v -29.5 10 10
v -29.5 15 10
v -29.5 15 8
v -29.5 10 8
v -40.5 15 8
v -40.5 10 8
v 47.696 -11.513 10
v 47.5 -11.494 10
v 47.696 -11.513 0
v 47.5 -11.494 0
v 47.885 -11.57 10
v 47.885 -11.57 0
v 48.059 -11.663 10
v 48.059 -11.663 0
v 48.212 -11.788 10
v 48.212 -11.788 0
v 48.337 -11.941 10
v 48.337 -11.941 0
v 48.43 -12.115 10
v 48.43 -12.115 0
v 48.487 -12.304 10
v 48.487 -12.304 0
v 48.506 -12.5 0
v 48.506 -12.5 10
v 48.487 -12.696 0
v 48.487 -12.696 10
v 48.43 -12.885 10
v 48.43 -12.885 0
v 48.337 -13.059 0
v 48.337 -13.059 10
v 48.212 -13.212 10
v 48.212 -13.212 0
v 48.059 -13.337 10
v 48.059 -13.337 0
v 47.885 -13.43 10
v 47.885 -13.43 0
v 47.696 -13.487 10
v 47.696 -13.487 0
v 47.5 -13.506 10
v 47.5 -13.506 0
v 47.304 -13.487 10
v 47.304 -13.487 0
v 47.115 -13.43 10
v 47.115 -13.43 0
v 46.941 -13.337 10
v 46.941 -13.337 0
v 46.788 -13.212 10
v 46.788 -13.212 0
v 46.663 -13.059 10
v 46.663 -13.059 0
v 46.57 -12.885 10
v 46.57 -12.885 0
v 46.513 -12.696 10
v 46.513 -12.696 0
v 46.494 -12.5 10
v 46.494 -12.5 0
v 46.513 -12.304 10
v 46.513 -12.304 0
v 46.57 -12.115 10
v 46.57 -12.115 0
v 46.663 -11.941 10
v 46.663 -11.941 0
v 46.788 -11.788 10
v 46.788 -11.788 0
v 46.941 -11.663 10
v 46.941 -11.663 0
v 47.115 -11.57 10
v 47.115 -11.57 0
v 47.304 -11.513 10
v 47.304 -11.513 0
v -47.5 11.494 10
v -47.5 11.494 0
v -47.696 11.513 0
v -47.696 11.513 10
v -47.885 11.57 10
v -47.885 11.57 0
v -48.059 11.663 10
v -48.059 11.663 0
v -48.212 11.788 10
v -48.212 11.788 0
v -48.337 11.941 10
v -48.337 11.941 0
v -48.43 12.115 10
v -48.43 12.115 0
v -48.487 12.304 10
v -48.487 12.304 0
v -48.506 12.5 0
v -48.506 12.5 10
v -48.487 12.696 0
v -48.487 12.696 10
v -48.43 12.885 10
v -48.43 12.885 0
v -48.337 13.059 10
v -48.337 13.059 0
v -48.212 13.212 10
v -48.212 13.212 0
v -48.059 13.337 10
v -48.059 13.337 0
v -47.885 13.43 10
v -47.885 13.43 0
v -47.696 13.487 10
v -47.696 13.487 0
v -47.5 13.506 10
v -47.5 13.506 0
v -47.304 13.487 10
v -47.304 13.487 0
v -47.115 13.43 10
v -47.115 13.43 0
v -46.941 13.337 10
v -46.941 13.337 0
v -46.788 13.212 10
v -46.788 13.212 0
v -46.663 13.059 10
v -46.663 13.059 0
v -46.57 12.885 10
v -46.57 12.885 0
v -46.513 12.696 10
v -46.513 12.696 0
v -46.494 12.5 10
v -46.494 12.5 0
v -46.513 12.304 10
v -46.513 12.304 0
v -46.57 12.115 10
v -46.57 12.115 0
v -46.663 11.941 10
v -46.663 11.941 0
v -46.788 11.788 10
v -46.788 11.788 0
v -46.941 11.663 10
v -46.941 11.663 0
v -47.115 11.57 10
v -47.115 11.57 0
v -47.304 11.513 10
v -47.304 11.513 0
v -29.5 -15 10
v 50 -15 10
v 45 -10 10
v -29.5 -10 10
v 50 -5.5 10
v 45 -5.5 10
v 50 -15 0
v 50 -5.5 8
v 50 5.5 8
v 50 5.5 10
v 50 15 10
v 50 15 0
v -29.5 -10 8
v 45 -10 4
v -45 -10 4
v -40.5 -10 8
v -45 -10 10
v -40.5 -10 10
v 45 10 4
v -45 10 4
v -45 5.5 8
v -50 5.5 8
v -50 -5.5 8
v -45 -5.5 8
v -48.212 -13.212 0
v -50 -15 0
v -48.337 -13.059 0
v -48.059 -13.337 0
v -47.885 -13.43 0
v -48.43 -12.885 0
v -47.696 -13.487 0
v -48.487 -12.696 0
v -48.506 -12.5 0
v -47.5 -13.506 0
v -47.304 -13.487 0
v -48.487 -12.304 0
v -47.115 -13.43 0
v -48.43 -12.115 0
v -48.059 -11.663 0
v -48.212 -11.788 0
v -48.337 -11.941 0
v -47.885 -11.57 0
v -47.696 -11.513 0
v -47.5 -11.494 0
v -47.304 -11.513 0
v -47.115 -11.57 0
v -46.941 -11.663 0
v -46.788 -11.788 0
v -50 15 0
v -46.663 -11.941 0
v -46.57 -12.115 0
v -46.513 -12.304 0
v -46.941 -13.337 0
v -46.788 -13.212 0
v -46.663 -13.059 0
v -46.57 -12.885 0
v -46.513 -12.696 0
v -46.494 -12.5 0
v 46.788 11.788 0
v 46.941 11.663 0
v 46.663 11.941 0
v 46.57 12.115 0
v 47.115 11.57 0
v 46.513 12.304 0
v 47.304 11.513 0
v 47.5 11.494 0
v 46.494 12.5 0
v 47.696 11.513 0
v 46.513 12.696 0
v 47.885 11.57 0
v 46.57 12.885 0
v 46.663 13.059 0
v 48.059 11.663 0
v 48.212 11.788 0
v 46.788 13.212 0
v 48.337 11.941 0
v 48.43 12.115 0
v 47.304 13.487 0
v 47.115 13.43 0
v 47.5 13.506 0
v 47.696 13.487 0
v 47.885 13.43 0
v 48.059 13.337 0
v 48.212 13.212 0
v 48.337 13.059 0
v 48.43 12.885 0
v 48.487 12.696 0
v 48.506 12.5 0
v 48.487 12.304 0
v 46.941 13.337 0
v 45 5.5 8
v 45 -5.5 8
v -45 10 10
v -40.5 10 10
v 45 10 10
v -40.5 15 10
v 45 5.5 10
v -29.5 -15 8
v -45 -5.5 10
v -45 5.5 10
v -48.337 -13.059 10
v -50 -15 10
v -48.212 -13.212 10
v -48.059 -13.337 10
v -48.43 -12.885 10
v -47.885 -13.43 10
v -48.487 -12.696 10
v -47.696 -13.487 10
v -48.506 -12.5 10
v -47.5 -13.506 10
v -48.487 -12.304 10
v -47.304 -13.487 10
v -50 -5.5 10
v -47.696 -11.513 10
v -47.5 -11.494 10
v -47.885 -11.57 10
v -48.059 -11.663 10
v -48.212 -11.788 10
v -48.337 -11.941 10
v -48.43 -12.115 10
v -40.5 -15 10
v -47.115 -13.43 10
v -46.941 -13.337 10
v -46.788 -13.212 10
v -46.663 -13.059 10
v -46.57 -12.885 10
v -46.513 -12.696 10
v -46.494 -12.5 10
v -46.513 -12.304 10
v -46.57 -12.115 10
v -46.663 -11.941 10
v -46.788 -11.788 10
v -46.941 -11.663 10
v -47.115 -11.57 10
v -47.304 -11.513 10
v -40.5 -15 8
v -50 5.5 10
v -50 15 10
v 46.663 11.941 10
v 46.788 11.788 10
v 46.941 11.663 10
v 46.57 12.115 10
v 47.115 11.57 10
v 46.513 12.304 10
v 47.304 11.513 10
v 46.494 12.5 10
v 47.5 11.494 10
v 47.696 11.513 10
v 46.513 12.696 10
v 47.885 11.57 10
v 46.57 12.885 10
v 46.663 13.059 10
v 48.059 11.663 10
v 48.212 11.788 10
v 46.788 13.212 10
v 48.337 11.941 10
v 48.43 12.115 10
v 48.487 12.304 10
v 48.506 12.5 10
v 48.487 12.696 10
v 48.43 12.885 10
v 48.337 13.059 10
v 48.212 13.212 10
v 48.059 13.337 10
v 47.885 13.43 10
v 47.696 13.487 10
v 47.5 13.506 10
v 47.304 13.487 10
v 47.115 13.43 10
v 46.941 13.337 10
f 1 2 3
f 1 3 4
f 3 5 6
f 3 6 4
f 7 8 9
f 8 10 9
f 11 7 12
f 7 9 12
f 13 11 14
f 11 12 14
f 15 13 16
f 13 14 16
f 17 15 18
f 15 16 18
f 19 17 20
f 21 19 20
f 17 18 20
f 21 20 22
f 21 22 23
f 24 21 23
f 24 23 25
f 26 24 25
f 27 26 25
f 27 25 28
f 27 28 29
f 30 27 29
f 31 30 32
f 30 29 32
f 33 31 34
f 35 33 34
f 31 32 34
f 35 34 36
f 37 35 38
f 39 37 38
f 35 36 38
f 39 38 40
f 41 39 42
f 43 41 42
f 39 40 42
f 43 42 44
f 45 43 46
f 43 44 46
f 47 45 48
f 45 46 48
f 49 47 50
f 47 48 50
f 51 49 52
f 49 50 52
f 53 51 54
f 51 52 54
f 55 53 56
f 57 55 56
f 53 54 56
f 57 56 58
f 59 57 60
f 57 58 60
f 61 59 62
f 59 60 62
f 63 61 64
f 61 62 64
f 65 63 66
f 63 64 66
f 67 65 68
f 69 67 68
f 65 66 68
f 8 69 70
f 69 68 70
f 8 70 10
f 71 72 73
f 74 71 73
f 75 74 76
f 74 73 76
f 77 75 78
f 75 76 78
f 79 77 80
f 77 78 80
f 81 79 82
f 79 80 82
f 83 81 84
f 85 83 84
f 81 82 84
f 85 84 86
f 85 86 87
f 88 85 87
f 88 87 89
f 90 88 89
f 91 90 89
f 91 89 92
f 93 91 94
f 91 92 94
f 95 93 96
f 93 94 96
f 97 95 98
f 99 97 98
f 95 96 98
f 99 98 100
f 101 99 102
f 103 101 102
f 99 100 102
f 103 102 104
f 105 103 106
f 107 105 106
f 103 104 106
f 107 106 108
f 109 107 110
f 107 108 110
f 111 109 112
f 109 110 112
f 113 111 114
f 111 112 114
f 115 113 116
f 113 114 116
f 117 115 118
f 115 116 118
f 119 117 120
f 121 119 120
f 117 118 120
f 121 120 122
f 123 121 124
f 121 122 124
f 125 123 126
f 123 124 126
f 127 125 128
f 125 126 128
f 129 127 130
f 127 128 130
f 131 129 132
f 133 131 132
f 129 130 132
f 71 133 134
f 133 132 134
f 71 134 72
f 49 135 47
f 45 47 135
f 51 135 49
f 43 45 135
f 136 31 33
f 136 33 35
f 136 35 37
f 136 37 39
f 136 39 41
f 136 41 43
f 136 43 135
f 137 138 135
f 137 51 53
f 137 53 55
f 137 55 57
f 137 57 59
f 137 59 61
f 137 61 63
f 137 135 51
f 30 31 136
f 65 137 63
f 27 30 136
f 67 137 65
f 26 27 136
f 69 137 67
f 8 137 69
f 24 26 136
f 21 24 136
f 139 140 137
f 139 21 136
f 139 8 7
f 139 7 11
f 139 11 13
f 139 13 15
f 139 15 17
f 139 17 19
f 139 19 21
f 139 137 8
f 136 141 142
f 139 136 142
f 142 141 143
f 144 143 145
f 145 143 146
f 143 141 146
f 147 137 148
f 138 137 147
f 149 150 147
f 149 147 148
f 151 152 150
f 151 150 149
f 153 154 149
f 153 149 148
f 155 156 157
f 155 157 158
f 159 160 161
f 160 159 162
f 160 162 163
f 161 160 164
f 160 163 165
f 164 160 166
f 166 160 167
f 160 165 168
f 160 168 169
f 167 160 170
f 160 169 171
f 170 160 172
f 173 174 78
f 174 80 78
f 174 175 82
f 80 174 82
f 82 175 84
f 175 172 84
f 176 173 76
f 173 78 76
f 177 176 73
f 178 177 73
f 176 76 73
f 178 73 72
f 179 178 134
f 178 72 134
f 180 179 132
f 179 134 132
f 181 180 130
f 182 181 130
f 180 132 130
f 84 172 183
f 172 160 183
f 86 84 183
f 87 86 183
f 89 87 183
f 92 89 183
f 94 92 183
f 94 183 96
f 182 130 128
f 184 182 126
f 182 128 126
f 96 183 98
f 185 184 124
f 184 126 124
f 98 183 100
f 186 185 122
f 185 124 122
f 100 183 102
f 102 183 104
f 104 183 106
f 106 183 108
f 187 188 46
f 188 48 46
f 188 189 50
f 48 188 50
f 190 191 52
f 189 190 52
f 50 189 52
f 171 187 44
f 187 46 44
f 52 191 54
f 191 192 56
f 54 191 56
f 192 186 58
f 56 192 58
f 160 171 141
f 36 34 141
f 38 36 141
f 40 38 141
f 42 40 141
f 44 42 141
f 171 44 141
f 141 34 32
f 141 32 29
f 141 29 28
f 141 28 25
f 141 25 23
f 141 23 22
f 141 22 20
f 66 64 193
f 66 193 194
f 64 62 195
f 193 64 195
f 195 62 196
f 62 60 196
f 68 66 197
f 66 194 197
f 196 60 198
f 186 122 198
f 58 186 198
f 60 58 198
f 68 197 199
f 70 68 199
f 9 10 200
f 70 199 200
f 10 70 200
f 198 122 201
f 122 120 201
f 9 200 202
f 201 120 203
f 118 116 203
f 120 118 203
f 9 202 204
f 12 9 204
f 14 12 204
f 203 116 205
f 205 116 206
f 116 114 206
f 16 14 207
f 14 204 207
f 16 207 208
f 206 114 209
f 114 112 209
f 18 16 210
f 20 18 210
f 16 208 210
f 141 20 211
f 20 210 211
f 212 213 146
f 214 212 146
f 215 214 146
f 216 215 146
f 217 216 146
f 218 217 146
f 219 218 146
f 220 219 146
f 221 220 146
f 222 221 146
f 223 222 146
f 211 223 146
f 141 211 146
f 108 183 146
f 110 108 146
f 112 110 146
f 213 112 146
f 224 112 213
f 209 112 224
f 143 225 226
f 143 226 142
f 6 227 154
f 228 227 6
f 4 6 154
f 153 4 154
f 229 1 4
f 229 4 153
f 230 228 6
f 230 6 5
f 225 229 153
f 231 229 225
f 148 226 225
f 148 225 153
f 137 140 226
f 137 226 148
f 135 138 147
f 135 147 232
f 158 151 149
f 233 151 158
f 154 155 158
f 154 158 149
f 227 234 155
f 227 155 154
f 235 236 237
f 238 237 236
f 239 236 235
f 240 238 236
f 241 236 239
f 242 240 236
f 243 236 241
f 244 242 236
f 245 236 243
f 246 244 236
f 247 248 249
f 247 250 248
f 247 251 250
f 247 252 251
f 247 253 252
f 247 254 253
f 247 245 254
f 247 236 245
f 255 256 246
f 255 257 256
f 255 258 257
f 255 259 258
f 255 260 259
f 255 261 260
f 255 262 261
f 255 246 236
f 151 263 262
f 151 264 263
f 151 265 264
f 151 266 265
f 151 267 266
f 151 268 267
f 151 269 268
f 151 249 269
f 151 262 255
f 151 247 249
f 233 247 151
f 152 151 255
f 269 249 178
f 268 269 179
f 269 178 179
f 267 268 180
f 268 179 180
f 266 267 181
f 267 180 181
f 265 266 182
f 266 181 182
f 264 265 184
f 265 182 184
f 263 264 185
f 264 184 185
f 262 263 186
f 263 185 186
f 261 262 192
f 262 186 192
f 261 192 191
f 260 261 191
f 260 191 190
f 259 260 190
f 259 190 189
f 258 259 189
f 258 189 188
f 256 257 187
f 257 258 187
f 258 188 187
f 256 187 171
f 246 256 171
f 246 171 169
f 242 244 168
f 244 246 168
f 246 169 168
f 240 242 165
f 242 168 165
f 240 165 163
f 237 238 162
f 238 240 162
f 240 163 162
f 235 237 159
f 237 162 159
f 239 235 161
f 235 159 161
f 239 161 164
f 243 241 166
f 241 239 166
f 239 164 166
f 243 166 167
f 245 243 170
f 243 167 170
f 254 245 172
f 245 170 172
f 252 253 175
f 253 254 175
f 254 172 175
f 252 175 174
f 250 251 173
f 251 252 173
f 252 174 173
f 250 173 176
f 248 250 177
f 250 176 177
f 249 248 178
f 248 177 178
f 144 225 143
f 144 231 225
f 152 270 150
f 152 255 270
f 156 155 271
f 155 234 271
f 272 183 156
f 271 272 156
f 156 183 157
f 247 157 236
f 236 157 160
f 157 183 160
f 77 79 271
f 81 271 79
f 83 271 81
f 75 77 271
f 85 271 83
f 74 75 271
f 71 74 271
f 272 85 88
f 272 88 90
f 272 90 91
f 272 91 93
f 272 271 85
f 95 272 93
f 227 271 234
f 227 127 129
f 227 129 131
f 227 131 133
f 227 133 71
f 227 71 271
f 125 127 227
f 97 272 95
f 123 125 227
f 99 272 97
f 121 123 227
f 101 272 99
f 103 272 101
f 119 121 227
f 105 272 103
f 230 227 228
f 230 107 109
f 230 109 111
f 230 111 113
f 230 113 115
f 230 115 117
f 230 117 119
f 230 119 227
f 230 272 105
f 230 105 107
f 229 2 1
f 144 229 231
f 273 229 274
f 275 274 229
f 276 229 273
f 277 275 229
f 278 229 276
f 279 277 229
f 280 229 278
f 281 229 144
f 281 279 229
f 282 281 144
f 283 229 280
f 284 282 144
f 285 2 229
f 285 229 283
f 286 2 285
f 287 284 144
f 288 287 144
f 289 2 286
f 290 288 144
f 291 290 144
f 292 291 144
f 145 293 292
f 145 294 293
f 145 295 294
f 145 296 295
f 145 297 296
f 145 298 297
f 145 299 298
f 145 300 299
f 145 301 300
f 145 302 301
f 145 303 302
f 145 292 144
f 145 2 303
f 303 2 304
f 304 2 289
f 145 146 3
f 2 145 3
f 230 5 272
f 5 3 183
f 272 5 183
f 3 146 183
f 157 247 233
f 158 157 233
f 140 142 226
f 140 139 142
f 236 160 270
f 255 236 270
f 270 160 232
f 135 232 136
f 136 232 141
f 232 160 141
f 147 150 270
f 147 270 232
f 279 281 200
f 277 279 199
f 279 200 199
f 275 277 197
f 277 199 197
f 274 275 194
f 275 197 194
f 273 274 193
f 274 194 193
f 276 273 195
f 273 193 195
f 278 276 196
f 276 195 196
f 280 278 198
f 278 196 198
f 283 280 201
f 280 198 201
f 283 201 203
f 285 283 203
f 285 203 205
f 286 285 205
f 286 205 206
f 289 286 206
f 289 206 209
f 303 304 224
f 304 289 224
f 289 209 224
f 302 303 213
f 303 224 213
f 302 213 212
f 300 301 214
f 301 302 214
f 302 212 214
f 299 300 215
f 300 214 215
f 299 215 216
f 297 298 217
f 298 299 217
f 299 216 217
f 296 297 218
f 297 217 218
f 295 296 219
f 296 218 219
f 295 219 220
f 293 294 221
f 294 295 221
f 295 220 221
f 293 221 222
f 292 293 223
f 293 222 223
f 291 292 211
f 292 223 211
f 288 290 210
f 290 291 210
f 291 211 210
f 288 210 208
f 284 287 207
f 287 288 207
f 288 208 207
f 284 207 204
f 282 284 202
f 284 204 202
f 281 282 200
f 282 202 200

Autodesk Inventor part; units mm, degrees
ref_plane "YZ Plane" through (0, 0, 0) normal (1, 0, 0) x (0, 1, 0)
ref_plane "XZ Plane" through (0, 0, 0) normal (0, 1, 0) x (-1, 0, 0)
ref_plane "XY Plane" through (0, 0, 0) normal (0, 0, 1) x (1, 0, 0)
sketch "Sketch1" plane through (0, 0, 0) normal (0, 0, 1) x (1, 0, 0)
  line L0 (-50, -15) -> (50, -15)
  line L1 (50, -15) -> (50, 15)
  line L2 (50, 15) -> (-50, 15)
  line L3 (-50, 15) -> (-50, -15)
  line L4 (-50, -15) -> (50, 15) construction
  line L5 (50, -15) -> (-50, 15) construction
  point P0 (0, 0)
  dimension "d0" = 100
  dimension "d1" = 30
extrude "Extrusion1" add sketch "Sketch1" along normal blind 10
sketch "Sketch2" plane through (0, 0, 10) normal (0, 0, 1) x (1, 0, 0)
  line L0 (-50, -15) -> (50, -15) projected
  line L1 (50, -15) -> (50, 15) projected
  line L2 (50, 15) -> (-50, 15) projected
  line L3 (-50, 15) -> (-50, -15) projected
  line L4 (-45, 10) -> (45, 10)
  line L5 (45, 10) -> (45, -10)
  line L6 (45, -10) -> (-45, -10)
  line L7 (-45, -10) -> (-45, 10)
  point P0 (0, 0)
  dimension "d4" = 5
extrude "Extrusion2" cut sketch "Sketch2" against normal blind 6 contours L4 L5 L6 L7
sketch "Sketch3" plane through (0, 0, 10) normal (0, 0, 1) x (1, 0, 0)
  line L0 (-45, -10) -> (-45, 10) projected
  line L1 (-45, 10) -> (45, 10) projected
  line L2 (45, 10) -> (45, -10) projected
  line L3 (45, -10) -> (-45, -10) projected
  line L4 (-50, -15) -> (50, -15) projected
  line L5 (50, -15) -> (50, 15) projected
  line L6 (50, 15) -> (-50, 15) projected
  line L7 (-50, 15) -> (-50, -15) projected
  line L8 (-50, 15) -> (-50, -15) projected
  line L9 (-50, -5.5) -> (-45, -5.5)
  line L10 (-45, -5.5) -> (-45, 5.5)
  line L11 (-45, 5.5) -> (-50, 5.5)
  line L12 (-50, 5.5) -> (-50, -5.5)
  line L13 (-70, 0) -> (70, 0) projected
  line L14 (45, 10) -> (45, -10) projected
  line L15 (50, -15) -> (50, 15) projected
  line L16 (50, 15) -> (-50, 15) projected
  line L17 (-45, 10) -> (45, 10) projected
  line L18 (-40.5, 15) -> (-29.5, 15)
  line L19 (-29.5, 15) -> (-29.5, 10)
  line L20 (-29.5, 10) -> (-40.5, 10)
  line L21 (-40.5, 10) -> (-40.5, 15)
  line L22 (-35, 15) -> (-35, 10) construction
  line L23 (-45, 10) -> (45, 10) projected
  line L24 (45, -10) -> (-45, -10) projected
  line L25 (-50, -15) -> (50, -15) projected
  line L26 (-40.5, -10) -> (-29.5, -10)
  line L27 (-29.5, -10) -> (-29.5, -15)
  line L28 (-29.5, -15) -> (-40.5, -15)
  line L29 (-40.5, -15) -> (-40.5, -10)
  line L30 (45, 10) -> (45, -10) projected
  line L31 (45, 5.5) -> (50, 5.5)
  line L32 (50, 5.5) -> (50, -5.5)
  line L33 (50, -5.5) -> (45, -5.5)
  line L34 (45, -5.5) -> (45, 5.5)
  point P0 (0, 0)
  dimension "d7" = 11
  dimension "d9" = 11
  dimension "d10" = 15
  dimension "d28" = 11
  dimension "d29" = 11
extrude "Extrusion3" cut sketch "Sketch3" against normal blind 2 contours L9 L7 L13 L0 | L3 L27 L4 L29 | L13 L7 L11 L0 | L13 L5 L33 L2 | L2 L31 L5 L13 | L21 L6 L19 L1
sketch "Sketch4" plane through (0, 0, 10) normal (0, 0, 1) x (1, 0, 0)
  line L0 (-50, -15) -> (50, -15) projected
  line L1 (-50, 15) -> (-50, -15) projected
  line L2 (50, 15) -> (-50, 15) projected
  line L3 (50, -15) -> (50, 15) projected
  point P0 (0, 0)
  point P1 (-47.5, 12.5)
  dimension "d16" = 2.5
  dimension "d17" = 2.5
hole "Hole1" at (-47.5, 12.5, 10) direction (0, 0, -1) diameter 2.013 end through all thread size "M2.5x0.45" class "6H" standard "ANSI Metric M Profile"
mirror "Mirror1" about plane through (0, 0, 0) normal (0, 1, 0) of "Hole1"
mirror "Mirror2" about plane through (0, 0, 0) normal (1, 0, 0) of "Hole1", "Mirror1"
equation "\"d9\" = d7"
equation "\"d28\" = d7"
equation "\"d29\" = d7"
properties part number "PassiveSwitchCase"
